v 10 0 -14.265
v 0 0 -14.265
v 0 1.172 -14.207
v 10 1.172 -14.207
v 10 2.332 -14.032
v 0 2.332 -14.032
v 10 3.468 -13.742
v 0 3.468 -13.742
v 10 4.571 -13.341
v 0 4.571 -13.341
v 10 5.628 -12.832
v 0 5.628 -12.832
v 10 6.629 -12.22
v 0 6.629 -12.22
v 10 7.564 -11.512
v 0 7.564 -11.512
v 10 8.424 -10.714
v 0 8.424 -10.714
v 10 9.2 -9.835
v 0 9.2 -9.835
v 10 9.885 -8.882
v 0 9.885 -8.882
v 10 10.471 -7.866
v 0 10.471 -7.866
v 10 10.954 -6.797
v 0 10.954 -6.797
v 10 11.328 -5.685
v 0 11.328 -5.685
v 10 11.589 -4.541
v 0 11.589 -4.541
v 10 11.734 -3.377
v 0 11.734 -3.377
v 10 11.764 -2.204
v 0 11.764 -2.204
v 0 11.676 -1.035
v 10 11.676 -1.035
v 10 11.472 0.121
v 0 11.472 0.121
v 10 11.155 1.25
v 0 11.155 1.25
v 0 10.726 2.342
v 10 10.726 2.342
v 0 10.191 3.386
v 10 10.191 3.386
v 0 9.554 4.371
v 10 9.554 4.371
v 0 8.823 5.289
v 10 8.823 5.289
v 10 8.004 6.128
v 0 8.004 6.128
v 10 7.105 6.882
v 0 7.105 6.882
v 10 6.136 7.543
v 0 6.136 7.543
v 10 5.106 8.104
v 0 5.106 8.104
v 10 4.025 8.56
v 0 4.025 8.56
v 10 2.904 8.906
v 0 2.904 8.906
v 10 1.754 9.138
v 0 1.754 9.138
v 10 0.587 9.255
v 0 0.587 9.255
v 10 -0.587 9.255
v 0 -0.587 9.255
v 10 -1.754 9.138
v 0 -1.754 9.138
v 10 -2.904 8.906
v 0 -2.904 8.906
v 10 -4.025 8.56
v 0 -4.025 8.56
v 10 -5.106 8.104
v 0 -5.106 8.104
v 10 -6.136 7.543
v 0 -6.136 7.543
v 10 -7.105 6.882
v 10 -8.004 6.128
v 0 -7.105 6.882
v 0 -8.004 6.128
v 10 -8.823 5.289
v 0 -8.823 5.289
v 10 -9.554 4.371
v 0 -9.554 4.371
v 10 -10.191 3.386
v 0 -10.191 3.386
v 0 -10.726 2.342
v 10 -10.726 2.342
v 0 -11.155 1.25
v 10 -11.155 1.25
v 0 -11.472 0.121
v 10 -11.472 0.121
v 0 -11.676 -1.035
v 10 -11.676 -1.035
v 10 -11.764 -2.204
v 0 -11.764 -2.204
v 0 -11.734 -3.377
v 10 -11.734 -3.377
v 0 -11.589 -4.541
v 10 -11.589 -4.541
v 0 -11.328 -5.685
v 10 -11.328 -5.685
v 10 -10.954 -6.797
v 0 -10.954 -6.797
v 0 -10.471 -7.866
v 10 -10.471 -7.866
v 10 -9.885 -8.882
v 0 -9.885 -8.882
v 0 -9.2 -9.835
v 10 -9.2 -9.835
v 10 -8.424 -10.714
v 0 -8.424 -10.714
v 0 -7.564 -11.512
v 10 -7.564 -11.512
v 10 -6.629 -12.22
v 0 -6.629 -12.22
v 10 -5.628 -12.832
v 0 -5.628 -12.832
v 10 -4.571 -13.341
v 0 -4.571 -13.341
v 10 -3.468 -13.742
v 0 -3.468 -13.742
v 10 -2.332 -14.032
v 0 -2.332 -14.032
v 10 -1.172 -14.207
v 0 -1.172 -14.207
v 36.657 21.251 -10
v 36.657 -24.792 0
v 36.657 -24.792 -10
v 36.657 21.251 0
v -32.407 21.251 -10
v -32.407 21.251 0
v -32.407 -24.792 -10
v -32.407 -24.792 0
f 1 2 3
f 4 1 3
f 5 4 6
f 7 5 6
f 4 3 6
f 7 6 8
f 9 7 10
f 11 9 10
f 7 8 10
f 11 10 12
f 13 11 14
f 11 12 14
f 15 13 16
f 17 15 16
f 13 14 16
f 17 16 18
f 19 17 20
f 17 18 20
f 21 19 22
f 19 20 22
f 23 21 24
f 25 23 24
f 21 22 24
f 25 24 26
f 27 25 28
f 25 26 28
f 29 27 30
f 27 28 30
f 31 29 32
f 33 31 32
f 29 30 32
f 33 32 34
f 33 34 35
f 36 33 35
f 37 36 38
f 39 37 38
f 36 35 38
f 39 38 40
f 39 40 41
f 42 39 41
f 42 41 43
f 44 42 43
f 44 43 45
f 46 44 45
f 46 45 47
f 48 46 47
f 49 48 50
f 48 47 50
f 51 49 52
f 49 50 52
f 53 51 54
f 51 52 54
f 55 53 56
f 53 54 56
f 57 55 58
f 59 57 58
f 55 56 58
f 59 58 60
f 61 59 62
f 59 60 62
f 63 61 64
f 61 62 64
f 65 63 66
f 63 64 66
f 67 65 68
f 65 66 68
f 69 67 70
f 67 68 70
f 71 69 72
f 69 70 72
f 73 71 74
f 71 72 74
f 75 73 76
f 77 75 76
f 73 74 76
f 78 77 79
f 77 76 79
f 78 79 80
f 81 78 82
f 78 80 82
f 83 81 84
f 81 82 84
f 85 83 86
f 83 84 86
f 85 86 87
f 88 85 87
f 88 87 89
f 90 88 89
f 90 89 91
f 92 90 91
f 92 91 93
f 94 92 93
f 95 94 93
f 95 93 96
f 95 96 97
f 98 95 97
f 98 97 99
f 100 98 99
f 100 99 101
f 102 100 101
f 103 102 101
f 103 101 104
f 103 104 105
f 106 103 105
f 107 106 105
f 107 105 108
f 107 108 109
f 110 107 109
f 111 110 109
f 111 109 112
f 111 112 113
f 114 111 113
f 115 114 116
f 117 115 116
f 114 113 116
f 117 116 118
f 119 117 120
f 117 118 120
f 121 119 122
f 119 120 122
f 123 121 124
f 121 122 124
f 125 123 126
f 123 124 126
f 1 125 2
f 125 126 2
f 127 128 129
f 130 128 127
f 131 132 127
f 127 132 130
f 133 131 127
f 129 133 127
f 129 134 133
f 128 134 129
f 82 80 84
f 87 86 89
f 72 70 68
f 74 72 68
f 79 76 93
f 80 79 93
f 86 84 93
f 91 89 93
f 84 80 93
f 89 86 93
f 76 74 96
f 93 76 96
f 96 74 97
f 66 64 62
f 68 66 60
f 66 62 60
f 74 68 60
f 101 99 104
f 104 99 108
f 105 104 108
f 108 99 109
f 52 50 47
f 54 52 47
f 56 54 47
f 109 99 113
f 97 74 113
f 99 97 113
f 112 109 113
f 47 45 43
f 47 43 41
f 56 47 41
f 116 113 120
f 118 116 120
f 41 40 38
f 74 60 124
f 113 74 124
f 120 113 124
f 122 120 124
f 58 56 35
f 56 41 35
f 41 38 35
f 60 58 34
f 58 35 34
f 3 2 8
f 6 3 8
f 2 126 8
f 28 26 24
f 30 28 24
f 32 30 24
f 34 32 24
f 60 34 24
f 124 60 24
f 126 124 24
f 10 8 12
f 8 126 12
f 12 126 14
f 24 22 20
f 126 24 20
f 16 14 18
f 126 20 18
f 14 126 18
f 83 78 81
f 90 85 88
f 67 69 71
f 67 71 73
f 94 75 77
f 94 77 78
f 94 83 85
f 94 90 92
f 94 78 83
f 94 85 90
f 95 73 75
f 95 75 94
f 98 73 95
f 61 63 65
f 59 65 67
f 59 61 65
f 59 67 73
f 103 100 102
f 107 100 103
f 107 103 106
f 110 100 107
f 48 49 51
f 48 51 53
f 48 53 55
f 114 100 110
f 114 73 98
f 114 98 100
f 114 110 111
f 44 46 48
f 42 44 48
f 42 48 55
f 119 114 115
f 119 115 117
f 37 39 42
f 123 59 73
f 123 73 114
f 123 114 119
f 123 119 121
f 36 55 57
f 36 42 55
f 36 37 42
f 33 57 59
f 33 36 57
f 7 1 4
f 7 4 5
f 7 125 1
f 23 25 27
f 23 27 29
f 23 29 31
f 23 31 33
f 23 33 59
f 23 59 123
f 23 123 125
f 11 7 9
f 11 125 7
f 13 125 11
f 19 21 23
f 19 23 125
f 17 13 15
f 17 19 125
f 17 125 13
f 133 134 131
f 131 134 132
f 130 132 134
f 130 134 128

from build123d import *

# Parameters (mm, degrees)
SKETCH_1_W      = 69.064774026
SKETCH_1_H      = 46.043182684
EXTRUDE_1_DEPTH = 10
SKETCH_2_R      = 11.767350743
EXTRUDE_3_DEPTH = 10


with BuildPart() as part:
    # Эскиз1 → Бобышка-Вытянуть1 (new body)
    with BuildSketch(Plane.XY):
        with Locations((2.12506997, -1.770891642)):
            Rectangle(SKETCH_1_W, SKETCH_1_H)
    extrude(amount=-EXTRUDE_1_DEPTH)


with BuildPart() as body_2:
    # Эскиз2 → Бобышка-Вытянуть3 (new body)
    with BuildSketch(Plane(origin=(0, 0, 0), x_dir=(0, 0, -1), z_dir=(1, 0, 0))):
        with Locations((-19.75002894, 0)):
            Circle(SKETCH_2_R)
    extrude(amount=EXTRUDE_3_DEPTH)


with BuildPart() as body_2_1:
    # Move Body 1: moved
    add(body_2.part.moved(Location((0, 0, -22.247799759))))


solid = Compound([part.part, body_2_1.part])
